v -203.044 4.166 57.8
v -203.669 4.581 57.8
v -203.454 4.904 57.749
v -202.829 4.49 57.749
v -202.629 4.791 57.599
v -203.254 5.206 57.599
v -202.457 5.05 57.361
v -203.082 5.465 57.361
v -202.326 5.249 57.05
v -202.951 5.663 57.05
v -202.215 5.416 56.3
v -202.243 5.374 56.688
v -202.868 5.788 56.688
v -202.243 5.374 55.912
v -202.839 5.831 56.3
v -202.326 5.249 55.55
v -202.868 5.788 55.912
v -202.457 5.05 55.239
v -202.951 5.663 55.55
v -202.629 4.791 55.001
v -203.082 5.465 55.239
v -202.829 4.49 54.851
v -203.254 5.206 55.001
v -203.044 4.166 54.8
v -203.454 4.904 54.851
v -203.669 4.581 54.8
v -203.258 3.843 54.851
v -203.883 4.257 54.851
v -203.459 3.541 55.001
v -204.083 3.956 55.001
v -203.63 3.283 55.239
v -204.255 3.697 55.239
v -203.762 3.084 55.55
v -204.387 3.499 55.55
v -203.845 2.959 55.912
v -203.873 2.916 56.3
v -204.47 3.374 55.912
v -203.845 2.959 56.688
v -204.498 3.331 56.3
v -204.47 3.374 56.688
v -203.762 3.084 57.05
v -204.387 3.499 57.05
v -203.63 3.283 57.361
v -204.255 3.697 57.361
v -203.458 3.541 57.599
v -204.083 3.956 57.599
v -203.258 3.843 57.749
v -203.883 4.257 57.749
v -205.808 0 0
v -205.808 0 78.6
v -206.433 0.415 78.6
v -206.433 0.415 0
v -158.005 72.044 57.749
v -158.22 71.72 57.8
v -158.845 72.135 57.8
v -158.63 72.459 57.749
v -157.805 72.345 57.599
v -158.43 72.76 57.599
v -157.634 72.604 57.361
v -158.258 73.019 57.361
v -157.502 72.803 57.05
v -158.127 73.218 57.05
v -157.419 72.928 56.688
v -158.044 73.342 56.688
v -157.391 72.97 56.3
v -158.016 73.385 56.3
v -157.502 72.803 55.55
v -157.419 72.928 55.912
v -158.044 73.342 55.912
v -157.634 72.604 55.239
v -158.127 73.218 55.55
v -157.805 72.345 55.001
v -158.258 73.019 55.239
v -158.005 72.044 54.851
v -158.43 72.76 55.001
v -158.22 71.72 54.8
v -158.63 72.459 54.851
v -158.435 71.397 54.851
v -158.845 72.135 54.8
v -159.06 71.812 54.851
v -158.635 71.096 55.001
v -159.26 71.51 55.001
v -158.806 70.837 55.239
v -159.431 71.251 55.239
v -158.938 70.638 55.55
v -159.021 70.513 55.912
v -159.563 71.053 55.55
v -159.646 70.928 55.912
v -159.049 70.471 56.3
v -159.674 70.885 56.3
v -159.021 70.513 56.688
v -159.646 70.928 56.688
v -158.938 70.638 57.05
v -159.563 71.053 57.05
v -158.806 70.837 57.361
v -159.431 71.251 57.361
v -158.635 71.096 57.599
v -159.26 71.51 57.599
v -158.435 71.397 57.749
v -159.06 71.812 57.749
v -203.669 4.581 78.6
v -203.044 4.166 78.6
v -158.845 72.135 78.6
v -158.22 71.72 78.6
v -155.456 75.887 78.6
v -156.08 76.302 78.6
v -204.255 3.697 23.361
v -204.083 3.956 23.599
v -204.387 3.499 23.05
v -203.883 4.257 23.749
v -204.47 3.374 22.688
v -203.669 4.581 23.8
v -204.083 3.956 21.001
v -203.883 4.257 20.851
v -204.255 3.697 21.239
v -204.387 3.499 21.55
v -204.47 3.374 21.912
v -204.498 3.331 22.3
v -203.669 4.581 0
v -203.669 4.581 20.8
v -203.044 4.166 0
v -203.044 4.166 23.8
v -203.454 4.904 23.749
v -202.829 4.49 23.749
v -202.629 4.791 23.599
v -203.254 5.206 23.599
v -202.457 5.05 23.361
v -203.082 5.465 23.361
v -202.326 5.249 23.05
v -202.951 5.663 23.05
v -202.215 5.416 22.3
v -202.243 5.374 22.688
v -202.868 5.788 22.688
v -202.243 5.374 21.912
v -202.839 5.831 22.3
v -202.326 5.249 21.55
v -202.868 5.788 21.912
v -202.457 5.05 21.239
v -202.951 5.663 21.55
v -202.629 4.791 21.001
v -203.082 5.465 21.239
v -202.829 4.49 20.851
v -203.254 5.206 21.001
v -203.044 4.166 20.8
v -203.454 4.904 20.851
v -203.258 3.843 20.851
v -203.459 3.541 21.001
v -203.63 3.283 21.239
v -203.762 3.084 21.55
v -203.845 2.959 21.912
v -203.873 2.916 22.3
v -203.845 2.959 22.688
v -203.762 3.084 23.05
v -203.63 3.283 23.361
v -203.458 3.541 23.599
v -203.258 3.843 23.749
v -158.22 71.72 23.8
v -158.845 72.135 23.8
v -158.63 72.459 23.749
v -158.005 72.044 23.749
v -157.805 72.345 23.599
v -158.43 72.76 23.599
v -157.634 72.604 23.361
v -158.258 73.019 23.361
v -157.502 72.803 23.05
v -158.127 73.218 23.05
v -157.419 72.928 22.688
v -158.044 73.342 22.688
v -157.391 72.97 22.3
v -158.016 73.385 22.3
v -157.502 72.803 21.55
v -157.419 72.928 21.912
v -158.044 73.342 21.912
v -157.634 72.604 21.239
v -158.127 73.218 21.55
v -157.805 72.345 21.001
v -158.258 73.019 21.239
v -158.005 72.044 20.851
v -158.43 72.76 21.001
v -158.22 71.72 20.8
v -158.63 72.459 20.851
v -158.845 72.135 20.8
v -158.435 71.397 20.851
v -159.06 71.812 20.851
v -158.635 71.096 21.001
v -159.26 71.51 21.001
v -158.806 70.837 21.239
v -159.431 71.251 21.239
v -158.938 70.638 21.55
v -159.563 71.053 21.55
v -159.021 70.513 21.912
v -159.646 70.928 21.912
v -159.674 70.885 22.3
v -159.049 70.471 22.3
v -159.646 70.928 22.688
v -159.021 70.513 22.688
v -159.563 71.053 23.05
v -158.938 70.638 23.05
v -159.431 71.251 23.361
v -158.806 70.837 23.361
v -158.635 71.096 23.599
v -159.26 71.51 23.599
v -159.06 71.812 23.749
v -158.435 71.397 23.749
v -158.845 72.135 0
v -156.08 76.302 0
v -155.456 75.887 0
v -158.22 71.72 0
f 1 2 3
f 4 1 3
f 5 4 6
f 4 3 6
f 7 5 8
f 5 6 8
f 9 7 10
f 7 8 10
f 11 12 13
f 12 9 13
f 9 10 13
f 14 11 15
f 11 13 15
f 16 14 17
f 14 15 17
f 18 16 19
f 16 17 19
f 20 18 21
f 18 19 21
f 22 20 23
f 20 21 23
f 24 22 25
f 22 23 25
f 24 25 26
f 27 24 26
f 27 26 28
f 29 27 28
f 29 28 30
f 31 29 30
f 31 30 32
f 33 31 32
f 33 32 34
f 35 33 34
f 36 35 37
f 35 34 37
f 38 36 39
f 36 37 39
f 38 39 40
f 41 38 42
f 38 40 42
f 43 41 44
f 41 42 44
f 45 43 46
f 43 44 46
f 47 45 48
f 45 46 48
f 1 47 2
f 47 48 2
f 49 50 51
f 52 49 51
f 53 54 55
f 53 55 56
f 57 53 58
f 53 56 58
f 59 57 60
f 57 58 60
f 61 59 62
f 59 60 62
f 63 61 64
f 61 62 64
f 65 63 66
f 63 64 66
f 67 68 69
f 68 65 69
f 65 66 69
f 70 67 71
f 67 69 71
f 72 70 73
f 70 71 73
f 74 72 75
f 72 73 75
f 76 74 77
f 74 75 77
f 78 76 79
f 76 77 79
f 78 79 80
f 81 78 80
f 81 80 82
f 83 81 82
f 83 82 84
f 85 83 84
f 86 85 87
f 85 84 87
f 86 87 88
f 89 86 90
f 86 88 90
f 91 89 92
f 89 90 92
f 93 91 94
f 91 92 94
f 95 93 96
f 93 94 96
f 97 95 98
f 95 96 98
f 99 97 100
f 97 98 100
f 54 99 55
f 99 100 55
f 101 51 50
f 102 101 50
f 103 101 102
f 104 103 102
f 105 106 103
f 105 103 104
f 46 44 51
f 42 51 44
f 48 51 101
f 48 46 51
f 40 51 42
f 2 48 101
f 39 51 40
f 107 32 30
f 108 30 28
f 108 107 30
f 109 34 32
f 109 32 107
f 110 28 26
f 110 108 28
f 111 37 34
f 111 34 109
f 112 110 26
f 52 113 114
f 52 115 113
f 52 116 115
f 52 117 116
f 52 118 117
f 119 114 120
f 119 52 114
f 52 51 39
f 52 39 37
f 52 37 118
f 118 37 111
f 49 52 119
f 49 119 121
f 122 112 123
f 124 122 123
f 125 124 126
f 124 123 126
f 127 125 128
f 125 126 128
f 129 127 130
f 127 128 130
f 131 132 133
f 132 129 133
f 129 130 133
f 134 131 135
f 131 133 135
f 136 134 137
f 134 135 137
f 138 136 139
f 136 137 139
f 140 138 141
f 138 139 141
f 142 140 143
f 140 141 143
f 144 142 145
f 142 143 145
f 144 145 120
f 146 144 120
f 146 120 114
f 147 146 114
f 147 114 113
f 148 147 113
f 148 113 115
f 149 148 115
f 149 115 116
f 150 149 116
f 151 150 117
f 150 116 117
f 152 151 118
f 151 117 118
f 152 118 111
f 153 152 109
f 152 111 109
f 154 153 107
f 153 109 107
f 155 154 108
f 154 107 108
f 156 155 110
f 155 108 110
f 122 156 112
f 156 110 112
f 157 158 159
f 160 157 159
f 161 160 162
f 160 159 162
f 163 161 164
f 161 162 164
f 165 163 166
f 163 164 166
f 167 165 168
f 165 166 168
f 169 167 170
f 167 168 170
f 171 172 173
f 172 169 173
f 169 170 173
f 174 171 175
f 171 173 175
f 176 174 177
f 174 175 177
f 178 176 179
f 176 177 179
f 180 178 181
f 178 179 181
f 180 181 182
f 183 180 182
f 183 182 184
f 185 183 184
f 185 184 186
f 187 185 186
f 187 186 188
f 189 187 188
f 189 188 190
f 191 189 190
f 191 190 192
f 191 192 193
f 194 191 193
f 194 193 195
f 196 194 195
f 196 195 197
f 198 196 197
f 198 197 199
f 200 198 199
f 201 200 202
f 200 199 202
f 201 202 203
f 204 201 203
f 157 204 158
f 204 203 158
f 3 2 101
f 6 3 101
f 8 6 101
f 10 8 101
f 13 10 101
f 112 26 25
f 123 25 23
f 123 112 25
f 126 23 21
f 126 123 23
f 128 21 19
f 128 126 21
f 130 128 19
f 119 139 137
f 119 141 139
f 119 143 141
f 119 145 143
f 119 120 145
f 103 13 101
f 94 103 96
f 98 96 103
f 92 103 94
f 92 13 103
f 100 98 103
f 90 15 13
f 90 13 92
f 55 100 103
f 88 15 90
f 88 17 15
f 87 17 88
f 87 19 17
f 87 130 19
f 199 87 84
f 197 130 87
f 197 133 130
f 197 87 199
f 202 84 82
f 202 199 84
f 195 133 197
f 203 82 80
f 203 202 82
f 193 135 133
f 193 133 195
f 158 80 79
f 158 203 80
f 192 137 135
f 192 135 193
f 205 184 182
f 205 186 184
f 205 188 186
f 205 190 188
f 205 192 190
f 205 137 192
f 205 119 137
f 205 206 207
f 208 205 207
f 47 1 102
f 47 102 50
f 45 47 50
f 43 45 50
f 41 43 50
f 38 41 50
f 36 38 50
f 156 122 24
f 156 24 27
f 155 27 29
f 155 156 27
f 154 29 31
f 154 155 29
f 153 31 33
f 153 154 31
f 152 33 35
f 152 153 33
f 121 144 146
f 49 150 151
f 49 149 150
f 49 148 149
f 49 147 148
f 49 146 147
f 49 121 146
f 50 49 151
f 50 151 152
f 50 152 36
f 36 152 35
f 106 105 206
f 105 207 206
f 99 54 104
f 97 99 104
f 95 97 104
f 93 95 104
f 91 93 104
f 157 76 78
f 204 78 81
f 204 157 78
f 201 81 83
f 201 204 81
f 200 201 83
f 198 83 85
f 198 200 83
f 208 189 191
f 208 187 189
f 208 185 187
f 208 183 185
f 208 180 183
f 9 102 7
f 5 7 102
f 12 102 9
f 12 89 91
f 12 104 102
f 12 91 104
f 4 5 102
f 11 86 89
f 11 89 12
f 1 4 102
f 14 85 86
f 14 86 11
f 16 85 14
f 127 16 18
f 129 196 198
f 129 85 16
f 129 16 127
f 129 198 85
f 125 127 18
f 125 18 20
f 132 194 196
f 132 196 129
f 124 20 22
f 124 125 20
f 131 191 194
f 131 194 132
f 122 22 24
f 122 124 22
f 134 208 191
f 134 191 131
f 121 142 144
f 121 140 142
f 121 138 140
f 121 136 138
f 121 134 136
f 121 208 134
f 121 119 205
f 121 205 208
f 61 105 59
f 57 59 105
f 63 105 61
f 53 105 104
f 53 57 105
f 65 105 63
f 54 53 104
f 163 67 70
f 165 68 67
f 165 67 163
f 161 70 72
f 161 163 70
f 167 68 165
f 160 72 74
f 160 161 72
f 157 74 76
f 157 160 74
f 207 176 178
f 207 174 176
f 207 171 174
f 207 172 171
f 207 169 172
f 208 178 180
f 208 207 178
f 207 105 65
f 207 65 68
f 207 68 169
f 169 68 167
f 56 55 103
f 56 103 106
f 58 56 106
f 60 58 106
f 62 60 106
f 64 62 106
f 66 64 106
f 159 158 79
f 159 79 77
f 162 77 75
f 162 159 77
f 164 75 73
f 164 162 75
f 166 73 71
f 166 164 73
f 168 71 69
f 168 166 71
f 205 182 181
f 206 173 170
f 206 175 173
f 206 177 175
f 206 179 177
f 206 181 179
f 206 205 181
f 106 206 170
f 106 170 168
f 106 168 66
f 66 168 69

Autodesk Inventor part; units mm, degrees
ref_plane "YZ Plane" through (0, 0, 0) normal (1, 0, 0) x (0, 1, 0)
ref_plane "XZ Plane" through (0, 0, 0) normal (0, 1, 0) x (-1, 0, 0)
ref_plane "XY Plane" through (0, 0, 0) normal (0, 0, 1) x (1, 0, 0)
sketch "スケッチ1" plane through (0, 0, 0) normal (0, 0, 1) x (1, 0, 0)
  circle A0 centre (152.1225, -73.6752) radius 4
  line L0 (206.0478, 0.7) -> (205.7783, 0.7)
  circle A1 centre (152.1225, -73.6752) radius 4
  line L1 (206.0478, 0.7) -> (205.7783, 0.7)
  circle A2 centre (171.8792, -18.7507) radius 14
  circle A3 centre (-152.1225, 73.6752) radius 4
  line L2 (-206.0478, -0.7) -> (-205.7783, -0.7)
  circle A4 centre (-152.1225, 73.6752) radius 4
  line L3 (-206.0478, -0.7) -> (-205.7783, -0.7)
  circle A5 centre (-171.8792, 18.7507) radius 14
  line L4 (-152.1225, 73.6752) -> (-155.4555, 75.8868)
  line L5 (-155.4555, 75.8868) -> (-205.8083, 0)
  circle A6 centre (152.1225, -73.6752) radius 4
  line L6 (206.0478, 0.7) -> (205.7783, 0.7)
  circle A7 centre (171.8792, -18.7507) radius 14
  line L7 (250, 0) -> (156.4849, 0)
  line L8 (-250, 0) -> (-156.4849, 0)
  line L9 (-205.8083, -0.7) -> (-205.8083, 0)
  line L10 (-206.5583, -0.7) -> (-206.5583, 0.2262)
  line L11 (-206.5583, 0.2262) -> (-155.6658, 76.9264)
  line L12 (-155.6658, 76.9264) -> (-151.7078, 74.3002) construction
  line L13 (-155.4555, 75.8868) -> (-156.0804, 76.3015)
  line L14 (-205.8083, 0) -> (-206.4332, 0.4147)
  line L15 (-203.6688, 4.5809) -> (-203.0438, 4.1663)
  line L16 (-158.2199, 71.7205) -> (-158.8449, 72.1352)
  point P0 (0, 0)
  point P1 (205.8083, 0.7)
  point P2 (205.8083, 0.7)
  point P3 (205.8083, 0.7)
  dimension "d2" = 360
  dimension "d6" = 360
  dimension "d8" = 0.75
  dimension "d11" = 5
  dimension "d12" = 5
  dimension "d27" = 56.435
extrude "押し出し1" add sketch "スケッチ1" along normal blind 78.6 contours L5 L16 L11 L13 | L5 L15 L11 L16 | L5 L14 L11 L15
sketch "スケッチ2" plane through (-206.4332, 0.4147, 0) normal (-0.8333, 0.5529, 0) x (0, 0, 1)
  line L0 (0, 91.0725) -> (0, 0) projected
  line L1 (0, 0) -> (78.6, 0) projected
  line L2 (78.6, 91.0725) -> (78.6, 0) projected
  line L3 (0, 91.0725) -> (78.6, 91.0725) projected
  line L4 (0, 86.0725) -> (78.6, 86.0725)
  line L5 (0, 5) -> (78.6, 5)
  line L6 (39.3, 91.0725) -> (39.3, 0)
  circle A0 centre (22.3, 5) radius 1.5
  circle A1 centre (56.3, 5) radius 1.5
  circle A2 centre (22.3, 86.0725) radius 1.5
  circle A3 centre (56.3, 86.0725) radius 1.5
  point P0 (0, 113.7886)
  dimension "d13" = 5
  dimension "d14" = 5
  dimension "d15" = 39.3
  dimension "d16" = 39.3
  dimension "d17" = 3
  dimension "d18" = 3
  dimension "d19" = 3
  dimension "d20" = 3
  dimension "d21" = 17
  dimension "d22" = 17
  dimension "d23" = 17
  dimension "d24" = 17
extrude "押し出し2" cut sketch "スケッチ2" against normal blind 10 contours A2 L4 | L4 A2 | A0 L5 | L5 A0 | A3 L4 | L4 A3 | A1 L5 | L5 A1
properties part number "モーターガード" material "ポリプロピレン"
